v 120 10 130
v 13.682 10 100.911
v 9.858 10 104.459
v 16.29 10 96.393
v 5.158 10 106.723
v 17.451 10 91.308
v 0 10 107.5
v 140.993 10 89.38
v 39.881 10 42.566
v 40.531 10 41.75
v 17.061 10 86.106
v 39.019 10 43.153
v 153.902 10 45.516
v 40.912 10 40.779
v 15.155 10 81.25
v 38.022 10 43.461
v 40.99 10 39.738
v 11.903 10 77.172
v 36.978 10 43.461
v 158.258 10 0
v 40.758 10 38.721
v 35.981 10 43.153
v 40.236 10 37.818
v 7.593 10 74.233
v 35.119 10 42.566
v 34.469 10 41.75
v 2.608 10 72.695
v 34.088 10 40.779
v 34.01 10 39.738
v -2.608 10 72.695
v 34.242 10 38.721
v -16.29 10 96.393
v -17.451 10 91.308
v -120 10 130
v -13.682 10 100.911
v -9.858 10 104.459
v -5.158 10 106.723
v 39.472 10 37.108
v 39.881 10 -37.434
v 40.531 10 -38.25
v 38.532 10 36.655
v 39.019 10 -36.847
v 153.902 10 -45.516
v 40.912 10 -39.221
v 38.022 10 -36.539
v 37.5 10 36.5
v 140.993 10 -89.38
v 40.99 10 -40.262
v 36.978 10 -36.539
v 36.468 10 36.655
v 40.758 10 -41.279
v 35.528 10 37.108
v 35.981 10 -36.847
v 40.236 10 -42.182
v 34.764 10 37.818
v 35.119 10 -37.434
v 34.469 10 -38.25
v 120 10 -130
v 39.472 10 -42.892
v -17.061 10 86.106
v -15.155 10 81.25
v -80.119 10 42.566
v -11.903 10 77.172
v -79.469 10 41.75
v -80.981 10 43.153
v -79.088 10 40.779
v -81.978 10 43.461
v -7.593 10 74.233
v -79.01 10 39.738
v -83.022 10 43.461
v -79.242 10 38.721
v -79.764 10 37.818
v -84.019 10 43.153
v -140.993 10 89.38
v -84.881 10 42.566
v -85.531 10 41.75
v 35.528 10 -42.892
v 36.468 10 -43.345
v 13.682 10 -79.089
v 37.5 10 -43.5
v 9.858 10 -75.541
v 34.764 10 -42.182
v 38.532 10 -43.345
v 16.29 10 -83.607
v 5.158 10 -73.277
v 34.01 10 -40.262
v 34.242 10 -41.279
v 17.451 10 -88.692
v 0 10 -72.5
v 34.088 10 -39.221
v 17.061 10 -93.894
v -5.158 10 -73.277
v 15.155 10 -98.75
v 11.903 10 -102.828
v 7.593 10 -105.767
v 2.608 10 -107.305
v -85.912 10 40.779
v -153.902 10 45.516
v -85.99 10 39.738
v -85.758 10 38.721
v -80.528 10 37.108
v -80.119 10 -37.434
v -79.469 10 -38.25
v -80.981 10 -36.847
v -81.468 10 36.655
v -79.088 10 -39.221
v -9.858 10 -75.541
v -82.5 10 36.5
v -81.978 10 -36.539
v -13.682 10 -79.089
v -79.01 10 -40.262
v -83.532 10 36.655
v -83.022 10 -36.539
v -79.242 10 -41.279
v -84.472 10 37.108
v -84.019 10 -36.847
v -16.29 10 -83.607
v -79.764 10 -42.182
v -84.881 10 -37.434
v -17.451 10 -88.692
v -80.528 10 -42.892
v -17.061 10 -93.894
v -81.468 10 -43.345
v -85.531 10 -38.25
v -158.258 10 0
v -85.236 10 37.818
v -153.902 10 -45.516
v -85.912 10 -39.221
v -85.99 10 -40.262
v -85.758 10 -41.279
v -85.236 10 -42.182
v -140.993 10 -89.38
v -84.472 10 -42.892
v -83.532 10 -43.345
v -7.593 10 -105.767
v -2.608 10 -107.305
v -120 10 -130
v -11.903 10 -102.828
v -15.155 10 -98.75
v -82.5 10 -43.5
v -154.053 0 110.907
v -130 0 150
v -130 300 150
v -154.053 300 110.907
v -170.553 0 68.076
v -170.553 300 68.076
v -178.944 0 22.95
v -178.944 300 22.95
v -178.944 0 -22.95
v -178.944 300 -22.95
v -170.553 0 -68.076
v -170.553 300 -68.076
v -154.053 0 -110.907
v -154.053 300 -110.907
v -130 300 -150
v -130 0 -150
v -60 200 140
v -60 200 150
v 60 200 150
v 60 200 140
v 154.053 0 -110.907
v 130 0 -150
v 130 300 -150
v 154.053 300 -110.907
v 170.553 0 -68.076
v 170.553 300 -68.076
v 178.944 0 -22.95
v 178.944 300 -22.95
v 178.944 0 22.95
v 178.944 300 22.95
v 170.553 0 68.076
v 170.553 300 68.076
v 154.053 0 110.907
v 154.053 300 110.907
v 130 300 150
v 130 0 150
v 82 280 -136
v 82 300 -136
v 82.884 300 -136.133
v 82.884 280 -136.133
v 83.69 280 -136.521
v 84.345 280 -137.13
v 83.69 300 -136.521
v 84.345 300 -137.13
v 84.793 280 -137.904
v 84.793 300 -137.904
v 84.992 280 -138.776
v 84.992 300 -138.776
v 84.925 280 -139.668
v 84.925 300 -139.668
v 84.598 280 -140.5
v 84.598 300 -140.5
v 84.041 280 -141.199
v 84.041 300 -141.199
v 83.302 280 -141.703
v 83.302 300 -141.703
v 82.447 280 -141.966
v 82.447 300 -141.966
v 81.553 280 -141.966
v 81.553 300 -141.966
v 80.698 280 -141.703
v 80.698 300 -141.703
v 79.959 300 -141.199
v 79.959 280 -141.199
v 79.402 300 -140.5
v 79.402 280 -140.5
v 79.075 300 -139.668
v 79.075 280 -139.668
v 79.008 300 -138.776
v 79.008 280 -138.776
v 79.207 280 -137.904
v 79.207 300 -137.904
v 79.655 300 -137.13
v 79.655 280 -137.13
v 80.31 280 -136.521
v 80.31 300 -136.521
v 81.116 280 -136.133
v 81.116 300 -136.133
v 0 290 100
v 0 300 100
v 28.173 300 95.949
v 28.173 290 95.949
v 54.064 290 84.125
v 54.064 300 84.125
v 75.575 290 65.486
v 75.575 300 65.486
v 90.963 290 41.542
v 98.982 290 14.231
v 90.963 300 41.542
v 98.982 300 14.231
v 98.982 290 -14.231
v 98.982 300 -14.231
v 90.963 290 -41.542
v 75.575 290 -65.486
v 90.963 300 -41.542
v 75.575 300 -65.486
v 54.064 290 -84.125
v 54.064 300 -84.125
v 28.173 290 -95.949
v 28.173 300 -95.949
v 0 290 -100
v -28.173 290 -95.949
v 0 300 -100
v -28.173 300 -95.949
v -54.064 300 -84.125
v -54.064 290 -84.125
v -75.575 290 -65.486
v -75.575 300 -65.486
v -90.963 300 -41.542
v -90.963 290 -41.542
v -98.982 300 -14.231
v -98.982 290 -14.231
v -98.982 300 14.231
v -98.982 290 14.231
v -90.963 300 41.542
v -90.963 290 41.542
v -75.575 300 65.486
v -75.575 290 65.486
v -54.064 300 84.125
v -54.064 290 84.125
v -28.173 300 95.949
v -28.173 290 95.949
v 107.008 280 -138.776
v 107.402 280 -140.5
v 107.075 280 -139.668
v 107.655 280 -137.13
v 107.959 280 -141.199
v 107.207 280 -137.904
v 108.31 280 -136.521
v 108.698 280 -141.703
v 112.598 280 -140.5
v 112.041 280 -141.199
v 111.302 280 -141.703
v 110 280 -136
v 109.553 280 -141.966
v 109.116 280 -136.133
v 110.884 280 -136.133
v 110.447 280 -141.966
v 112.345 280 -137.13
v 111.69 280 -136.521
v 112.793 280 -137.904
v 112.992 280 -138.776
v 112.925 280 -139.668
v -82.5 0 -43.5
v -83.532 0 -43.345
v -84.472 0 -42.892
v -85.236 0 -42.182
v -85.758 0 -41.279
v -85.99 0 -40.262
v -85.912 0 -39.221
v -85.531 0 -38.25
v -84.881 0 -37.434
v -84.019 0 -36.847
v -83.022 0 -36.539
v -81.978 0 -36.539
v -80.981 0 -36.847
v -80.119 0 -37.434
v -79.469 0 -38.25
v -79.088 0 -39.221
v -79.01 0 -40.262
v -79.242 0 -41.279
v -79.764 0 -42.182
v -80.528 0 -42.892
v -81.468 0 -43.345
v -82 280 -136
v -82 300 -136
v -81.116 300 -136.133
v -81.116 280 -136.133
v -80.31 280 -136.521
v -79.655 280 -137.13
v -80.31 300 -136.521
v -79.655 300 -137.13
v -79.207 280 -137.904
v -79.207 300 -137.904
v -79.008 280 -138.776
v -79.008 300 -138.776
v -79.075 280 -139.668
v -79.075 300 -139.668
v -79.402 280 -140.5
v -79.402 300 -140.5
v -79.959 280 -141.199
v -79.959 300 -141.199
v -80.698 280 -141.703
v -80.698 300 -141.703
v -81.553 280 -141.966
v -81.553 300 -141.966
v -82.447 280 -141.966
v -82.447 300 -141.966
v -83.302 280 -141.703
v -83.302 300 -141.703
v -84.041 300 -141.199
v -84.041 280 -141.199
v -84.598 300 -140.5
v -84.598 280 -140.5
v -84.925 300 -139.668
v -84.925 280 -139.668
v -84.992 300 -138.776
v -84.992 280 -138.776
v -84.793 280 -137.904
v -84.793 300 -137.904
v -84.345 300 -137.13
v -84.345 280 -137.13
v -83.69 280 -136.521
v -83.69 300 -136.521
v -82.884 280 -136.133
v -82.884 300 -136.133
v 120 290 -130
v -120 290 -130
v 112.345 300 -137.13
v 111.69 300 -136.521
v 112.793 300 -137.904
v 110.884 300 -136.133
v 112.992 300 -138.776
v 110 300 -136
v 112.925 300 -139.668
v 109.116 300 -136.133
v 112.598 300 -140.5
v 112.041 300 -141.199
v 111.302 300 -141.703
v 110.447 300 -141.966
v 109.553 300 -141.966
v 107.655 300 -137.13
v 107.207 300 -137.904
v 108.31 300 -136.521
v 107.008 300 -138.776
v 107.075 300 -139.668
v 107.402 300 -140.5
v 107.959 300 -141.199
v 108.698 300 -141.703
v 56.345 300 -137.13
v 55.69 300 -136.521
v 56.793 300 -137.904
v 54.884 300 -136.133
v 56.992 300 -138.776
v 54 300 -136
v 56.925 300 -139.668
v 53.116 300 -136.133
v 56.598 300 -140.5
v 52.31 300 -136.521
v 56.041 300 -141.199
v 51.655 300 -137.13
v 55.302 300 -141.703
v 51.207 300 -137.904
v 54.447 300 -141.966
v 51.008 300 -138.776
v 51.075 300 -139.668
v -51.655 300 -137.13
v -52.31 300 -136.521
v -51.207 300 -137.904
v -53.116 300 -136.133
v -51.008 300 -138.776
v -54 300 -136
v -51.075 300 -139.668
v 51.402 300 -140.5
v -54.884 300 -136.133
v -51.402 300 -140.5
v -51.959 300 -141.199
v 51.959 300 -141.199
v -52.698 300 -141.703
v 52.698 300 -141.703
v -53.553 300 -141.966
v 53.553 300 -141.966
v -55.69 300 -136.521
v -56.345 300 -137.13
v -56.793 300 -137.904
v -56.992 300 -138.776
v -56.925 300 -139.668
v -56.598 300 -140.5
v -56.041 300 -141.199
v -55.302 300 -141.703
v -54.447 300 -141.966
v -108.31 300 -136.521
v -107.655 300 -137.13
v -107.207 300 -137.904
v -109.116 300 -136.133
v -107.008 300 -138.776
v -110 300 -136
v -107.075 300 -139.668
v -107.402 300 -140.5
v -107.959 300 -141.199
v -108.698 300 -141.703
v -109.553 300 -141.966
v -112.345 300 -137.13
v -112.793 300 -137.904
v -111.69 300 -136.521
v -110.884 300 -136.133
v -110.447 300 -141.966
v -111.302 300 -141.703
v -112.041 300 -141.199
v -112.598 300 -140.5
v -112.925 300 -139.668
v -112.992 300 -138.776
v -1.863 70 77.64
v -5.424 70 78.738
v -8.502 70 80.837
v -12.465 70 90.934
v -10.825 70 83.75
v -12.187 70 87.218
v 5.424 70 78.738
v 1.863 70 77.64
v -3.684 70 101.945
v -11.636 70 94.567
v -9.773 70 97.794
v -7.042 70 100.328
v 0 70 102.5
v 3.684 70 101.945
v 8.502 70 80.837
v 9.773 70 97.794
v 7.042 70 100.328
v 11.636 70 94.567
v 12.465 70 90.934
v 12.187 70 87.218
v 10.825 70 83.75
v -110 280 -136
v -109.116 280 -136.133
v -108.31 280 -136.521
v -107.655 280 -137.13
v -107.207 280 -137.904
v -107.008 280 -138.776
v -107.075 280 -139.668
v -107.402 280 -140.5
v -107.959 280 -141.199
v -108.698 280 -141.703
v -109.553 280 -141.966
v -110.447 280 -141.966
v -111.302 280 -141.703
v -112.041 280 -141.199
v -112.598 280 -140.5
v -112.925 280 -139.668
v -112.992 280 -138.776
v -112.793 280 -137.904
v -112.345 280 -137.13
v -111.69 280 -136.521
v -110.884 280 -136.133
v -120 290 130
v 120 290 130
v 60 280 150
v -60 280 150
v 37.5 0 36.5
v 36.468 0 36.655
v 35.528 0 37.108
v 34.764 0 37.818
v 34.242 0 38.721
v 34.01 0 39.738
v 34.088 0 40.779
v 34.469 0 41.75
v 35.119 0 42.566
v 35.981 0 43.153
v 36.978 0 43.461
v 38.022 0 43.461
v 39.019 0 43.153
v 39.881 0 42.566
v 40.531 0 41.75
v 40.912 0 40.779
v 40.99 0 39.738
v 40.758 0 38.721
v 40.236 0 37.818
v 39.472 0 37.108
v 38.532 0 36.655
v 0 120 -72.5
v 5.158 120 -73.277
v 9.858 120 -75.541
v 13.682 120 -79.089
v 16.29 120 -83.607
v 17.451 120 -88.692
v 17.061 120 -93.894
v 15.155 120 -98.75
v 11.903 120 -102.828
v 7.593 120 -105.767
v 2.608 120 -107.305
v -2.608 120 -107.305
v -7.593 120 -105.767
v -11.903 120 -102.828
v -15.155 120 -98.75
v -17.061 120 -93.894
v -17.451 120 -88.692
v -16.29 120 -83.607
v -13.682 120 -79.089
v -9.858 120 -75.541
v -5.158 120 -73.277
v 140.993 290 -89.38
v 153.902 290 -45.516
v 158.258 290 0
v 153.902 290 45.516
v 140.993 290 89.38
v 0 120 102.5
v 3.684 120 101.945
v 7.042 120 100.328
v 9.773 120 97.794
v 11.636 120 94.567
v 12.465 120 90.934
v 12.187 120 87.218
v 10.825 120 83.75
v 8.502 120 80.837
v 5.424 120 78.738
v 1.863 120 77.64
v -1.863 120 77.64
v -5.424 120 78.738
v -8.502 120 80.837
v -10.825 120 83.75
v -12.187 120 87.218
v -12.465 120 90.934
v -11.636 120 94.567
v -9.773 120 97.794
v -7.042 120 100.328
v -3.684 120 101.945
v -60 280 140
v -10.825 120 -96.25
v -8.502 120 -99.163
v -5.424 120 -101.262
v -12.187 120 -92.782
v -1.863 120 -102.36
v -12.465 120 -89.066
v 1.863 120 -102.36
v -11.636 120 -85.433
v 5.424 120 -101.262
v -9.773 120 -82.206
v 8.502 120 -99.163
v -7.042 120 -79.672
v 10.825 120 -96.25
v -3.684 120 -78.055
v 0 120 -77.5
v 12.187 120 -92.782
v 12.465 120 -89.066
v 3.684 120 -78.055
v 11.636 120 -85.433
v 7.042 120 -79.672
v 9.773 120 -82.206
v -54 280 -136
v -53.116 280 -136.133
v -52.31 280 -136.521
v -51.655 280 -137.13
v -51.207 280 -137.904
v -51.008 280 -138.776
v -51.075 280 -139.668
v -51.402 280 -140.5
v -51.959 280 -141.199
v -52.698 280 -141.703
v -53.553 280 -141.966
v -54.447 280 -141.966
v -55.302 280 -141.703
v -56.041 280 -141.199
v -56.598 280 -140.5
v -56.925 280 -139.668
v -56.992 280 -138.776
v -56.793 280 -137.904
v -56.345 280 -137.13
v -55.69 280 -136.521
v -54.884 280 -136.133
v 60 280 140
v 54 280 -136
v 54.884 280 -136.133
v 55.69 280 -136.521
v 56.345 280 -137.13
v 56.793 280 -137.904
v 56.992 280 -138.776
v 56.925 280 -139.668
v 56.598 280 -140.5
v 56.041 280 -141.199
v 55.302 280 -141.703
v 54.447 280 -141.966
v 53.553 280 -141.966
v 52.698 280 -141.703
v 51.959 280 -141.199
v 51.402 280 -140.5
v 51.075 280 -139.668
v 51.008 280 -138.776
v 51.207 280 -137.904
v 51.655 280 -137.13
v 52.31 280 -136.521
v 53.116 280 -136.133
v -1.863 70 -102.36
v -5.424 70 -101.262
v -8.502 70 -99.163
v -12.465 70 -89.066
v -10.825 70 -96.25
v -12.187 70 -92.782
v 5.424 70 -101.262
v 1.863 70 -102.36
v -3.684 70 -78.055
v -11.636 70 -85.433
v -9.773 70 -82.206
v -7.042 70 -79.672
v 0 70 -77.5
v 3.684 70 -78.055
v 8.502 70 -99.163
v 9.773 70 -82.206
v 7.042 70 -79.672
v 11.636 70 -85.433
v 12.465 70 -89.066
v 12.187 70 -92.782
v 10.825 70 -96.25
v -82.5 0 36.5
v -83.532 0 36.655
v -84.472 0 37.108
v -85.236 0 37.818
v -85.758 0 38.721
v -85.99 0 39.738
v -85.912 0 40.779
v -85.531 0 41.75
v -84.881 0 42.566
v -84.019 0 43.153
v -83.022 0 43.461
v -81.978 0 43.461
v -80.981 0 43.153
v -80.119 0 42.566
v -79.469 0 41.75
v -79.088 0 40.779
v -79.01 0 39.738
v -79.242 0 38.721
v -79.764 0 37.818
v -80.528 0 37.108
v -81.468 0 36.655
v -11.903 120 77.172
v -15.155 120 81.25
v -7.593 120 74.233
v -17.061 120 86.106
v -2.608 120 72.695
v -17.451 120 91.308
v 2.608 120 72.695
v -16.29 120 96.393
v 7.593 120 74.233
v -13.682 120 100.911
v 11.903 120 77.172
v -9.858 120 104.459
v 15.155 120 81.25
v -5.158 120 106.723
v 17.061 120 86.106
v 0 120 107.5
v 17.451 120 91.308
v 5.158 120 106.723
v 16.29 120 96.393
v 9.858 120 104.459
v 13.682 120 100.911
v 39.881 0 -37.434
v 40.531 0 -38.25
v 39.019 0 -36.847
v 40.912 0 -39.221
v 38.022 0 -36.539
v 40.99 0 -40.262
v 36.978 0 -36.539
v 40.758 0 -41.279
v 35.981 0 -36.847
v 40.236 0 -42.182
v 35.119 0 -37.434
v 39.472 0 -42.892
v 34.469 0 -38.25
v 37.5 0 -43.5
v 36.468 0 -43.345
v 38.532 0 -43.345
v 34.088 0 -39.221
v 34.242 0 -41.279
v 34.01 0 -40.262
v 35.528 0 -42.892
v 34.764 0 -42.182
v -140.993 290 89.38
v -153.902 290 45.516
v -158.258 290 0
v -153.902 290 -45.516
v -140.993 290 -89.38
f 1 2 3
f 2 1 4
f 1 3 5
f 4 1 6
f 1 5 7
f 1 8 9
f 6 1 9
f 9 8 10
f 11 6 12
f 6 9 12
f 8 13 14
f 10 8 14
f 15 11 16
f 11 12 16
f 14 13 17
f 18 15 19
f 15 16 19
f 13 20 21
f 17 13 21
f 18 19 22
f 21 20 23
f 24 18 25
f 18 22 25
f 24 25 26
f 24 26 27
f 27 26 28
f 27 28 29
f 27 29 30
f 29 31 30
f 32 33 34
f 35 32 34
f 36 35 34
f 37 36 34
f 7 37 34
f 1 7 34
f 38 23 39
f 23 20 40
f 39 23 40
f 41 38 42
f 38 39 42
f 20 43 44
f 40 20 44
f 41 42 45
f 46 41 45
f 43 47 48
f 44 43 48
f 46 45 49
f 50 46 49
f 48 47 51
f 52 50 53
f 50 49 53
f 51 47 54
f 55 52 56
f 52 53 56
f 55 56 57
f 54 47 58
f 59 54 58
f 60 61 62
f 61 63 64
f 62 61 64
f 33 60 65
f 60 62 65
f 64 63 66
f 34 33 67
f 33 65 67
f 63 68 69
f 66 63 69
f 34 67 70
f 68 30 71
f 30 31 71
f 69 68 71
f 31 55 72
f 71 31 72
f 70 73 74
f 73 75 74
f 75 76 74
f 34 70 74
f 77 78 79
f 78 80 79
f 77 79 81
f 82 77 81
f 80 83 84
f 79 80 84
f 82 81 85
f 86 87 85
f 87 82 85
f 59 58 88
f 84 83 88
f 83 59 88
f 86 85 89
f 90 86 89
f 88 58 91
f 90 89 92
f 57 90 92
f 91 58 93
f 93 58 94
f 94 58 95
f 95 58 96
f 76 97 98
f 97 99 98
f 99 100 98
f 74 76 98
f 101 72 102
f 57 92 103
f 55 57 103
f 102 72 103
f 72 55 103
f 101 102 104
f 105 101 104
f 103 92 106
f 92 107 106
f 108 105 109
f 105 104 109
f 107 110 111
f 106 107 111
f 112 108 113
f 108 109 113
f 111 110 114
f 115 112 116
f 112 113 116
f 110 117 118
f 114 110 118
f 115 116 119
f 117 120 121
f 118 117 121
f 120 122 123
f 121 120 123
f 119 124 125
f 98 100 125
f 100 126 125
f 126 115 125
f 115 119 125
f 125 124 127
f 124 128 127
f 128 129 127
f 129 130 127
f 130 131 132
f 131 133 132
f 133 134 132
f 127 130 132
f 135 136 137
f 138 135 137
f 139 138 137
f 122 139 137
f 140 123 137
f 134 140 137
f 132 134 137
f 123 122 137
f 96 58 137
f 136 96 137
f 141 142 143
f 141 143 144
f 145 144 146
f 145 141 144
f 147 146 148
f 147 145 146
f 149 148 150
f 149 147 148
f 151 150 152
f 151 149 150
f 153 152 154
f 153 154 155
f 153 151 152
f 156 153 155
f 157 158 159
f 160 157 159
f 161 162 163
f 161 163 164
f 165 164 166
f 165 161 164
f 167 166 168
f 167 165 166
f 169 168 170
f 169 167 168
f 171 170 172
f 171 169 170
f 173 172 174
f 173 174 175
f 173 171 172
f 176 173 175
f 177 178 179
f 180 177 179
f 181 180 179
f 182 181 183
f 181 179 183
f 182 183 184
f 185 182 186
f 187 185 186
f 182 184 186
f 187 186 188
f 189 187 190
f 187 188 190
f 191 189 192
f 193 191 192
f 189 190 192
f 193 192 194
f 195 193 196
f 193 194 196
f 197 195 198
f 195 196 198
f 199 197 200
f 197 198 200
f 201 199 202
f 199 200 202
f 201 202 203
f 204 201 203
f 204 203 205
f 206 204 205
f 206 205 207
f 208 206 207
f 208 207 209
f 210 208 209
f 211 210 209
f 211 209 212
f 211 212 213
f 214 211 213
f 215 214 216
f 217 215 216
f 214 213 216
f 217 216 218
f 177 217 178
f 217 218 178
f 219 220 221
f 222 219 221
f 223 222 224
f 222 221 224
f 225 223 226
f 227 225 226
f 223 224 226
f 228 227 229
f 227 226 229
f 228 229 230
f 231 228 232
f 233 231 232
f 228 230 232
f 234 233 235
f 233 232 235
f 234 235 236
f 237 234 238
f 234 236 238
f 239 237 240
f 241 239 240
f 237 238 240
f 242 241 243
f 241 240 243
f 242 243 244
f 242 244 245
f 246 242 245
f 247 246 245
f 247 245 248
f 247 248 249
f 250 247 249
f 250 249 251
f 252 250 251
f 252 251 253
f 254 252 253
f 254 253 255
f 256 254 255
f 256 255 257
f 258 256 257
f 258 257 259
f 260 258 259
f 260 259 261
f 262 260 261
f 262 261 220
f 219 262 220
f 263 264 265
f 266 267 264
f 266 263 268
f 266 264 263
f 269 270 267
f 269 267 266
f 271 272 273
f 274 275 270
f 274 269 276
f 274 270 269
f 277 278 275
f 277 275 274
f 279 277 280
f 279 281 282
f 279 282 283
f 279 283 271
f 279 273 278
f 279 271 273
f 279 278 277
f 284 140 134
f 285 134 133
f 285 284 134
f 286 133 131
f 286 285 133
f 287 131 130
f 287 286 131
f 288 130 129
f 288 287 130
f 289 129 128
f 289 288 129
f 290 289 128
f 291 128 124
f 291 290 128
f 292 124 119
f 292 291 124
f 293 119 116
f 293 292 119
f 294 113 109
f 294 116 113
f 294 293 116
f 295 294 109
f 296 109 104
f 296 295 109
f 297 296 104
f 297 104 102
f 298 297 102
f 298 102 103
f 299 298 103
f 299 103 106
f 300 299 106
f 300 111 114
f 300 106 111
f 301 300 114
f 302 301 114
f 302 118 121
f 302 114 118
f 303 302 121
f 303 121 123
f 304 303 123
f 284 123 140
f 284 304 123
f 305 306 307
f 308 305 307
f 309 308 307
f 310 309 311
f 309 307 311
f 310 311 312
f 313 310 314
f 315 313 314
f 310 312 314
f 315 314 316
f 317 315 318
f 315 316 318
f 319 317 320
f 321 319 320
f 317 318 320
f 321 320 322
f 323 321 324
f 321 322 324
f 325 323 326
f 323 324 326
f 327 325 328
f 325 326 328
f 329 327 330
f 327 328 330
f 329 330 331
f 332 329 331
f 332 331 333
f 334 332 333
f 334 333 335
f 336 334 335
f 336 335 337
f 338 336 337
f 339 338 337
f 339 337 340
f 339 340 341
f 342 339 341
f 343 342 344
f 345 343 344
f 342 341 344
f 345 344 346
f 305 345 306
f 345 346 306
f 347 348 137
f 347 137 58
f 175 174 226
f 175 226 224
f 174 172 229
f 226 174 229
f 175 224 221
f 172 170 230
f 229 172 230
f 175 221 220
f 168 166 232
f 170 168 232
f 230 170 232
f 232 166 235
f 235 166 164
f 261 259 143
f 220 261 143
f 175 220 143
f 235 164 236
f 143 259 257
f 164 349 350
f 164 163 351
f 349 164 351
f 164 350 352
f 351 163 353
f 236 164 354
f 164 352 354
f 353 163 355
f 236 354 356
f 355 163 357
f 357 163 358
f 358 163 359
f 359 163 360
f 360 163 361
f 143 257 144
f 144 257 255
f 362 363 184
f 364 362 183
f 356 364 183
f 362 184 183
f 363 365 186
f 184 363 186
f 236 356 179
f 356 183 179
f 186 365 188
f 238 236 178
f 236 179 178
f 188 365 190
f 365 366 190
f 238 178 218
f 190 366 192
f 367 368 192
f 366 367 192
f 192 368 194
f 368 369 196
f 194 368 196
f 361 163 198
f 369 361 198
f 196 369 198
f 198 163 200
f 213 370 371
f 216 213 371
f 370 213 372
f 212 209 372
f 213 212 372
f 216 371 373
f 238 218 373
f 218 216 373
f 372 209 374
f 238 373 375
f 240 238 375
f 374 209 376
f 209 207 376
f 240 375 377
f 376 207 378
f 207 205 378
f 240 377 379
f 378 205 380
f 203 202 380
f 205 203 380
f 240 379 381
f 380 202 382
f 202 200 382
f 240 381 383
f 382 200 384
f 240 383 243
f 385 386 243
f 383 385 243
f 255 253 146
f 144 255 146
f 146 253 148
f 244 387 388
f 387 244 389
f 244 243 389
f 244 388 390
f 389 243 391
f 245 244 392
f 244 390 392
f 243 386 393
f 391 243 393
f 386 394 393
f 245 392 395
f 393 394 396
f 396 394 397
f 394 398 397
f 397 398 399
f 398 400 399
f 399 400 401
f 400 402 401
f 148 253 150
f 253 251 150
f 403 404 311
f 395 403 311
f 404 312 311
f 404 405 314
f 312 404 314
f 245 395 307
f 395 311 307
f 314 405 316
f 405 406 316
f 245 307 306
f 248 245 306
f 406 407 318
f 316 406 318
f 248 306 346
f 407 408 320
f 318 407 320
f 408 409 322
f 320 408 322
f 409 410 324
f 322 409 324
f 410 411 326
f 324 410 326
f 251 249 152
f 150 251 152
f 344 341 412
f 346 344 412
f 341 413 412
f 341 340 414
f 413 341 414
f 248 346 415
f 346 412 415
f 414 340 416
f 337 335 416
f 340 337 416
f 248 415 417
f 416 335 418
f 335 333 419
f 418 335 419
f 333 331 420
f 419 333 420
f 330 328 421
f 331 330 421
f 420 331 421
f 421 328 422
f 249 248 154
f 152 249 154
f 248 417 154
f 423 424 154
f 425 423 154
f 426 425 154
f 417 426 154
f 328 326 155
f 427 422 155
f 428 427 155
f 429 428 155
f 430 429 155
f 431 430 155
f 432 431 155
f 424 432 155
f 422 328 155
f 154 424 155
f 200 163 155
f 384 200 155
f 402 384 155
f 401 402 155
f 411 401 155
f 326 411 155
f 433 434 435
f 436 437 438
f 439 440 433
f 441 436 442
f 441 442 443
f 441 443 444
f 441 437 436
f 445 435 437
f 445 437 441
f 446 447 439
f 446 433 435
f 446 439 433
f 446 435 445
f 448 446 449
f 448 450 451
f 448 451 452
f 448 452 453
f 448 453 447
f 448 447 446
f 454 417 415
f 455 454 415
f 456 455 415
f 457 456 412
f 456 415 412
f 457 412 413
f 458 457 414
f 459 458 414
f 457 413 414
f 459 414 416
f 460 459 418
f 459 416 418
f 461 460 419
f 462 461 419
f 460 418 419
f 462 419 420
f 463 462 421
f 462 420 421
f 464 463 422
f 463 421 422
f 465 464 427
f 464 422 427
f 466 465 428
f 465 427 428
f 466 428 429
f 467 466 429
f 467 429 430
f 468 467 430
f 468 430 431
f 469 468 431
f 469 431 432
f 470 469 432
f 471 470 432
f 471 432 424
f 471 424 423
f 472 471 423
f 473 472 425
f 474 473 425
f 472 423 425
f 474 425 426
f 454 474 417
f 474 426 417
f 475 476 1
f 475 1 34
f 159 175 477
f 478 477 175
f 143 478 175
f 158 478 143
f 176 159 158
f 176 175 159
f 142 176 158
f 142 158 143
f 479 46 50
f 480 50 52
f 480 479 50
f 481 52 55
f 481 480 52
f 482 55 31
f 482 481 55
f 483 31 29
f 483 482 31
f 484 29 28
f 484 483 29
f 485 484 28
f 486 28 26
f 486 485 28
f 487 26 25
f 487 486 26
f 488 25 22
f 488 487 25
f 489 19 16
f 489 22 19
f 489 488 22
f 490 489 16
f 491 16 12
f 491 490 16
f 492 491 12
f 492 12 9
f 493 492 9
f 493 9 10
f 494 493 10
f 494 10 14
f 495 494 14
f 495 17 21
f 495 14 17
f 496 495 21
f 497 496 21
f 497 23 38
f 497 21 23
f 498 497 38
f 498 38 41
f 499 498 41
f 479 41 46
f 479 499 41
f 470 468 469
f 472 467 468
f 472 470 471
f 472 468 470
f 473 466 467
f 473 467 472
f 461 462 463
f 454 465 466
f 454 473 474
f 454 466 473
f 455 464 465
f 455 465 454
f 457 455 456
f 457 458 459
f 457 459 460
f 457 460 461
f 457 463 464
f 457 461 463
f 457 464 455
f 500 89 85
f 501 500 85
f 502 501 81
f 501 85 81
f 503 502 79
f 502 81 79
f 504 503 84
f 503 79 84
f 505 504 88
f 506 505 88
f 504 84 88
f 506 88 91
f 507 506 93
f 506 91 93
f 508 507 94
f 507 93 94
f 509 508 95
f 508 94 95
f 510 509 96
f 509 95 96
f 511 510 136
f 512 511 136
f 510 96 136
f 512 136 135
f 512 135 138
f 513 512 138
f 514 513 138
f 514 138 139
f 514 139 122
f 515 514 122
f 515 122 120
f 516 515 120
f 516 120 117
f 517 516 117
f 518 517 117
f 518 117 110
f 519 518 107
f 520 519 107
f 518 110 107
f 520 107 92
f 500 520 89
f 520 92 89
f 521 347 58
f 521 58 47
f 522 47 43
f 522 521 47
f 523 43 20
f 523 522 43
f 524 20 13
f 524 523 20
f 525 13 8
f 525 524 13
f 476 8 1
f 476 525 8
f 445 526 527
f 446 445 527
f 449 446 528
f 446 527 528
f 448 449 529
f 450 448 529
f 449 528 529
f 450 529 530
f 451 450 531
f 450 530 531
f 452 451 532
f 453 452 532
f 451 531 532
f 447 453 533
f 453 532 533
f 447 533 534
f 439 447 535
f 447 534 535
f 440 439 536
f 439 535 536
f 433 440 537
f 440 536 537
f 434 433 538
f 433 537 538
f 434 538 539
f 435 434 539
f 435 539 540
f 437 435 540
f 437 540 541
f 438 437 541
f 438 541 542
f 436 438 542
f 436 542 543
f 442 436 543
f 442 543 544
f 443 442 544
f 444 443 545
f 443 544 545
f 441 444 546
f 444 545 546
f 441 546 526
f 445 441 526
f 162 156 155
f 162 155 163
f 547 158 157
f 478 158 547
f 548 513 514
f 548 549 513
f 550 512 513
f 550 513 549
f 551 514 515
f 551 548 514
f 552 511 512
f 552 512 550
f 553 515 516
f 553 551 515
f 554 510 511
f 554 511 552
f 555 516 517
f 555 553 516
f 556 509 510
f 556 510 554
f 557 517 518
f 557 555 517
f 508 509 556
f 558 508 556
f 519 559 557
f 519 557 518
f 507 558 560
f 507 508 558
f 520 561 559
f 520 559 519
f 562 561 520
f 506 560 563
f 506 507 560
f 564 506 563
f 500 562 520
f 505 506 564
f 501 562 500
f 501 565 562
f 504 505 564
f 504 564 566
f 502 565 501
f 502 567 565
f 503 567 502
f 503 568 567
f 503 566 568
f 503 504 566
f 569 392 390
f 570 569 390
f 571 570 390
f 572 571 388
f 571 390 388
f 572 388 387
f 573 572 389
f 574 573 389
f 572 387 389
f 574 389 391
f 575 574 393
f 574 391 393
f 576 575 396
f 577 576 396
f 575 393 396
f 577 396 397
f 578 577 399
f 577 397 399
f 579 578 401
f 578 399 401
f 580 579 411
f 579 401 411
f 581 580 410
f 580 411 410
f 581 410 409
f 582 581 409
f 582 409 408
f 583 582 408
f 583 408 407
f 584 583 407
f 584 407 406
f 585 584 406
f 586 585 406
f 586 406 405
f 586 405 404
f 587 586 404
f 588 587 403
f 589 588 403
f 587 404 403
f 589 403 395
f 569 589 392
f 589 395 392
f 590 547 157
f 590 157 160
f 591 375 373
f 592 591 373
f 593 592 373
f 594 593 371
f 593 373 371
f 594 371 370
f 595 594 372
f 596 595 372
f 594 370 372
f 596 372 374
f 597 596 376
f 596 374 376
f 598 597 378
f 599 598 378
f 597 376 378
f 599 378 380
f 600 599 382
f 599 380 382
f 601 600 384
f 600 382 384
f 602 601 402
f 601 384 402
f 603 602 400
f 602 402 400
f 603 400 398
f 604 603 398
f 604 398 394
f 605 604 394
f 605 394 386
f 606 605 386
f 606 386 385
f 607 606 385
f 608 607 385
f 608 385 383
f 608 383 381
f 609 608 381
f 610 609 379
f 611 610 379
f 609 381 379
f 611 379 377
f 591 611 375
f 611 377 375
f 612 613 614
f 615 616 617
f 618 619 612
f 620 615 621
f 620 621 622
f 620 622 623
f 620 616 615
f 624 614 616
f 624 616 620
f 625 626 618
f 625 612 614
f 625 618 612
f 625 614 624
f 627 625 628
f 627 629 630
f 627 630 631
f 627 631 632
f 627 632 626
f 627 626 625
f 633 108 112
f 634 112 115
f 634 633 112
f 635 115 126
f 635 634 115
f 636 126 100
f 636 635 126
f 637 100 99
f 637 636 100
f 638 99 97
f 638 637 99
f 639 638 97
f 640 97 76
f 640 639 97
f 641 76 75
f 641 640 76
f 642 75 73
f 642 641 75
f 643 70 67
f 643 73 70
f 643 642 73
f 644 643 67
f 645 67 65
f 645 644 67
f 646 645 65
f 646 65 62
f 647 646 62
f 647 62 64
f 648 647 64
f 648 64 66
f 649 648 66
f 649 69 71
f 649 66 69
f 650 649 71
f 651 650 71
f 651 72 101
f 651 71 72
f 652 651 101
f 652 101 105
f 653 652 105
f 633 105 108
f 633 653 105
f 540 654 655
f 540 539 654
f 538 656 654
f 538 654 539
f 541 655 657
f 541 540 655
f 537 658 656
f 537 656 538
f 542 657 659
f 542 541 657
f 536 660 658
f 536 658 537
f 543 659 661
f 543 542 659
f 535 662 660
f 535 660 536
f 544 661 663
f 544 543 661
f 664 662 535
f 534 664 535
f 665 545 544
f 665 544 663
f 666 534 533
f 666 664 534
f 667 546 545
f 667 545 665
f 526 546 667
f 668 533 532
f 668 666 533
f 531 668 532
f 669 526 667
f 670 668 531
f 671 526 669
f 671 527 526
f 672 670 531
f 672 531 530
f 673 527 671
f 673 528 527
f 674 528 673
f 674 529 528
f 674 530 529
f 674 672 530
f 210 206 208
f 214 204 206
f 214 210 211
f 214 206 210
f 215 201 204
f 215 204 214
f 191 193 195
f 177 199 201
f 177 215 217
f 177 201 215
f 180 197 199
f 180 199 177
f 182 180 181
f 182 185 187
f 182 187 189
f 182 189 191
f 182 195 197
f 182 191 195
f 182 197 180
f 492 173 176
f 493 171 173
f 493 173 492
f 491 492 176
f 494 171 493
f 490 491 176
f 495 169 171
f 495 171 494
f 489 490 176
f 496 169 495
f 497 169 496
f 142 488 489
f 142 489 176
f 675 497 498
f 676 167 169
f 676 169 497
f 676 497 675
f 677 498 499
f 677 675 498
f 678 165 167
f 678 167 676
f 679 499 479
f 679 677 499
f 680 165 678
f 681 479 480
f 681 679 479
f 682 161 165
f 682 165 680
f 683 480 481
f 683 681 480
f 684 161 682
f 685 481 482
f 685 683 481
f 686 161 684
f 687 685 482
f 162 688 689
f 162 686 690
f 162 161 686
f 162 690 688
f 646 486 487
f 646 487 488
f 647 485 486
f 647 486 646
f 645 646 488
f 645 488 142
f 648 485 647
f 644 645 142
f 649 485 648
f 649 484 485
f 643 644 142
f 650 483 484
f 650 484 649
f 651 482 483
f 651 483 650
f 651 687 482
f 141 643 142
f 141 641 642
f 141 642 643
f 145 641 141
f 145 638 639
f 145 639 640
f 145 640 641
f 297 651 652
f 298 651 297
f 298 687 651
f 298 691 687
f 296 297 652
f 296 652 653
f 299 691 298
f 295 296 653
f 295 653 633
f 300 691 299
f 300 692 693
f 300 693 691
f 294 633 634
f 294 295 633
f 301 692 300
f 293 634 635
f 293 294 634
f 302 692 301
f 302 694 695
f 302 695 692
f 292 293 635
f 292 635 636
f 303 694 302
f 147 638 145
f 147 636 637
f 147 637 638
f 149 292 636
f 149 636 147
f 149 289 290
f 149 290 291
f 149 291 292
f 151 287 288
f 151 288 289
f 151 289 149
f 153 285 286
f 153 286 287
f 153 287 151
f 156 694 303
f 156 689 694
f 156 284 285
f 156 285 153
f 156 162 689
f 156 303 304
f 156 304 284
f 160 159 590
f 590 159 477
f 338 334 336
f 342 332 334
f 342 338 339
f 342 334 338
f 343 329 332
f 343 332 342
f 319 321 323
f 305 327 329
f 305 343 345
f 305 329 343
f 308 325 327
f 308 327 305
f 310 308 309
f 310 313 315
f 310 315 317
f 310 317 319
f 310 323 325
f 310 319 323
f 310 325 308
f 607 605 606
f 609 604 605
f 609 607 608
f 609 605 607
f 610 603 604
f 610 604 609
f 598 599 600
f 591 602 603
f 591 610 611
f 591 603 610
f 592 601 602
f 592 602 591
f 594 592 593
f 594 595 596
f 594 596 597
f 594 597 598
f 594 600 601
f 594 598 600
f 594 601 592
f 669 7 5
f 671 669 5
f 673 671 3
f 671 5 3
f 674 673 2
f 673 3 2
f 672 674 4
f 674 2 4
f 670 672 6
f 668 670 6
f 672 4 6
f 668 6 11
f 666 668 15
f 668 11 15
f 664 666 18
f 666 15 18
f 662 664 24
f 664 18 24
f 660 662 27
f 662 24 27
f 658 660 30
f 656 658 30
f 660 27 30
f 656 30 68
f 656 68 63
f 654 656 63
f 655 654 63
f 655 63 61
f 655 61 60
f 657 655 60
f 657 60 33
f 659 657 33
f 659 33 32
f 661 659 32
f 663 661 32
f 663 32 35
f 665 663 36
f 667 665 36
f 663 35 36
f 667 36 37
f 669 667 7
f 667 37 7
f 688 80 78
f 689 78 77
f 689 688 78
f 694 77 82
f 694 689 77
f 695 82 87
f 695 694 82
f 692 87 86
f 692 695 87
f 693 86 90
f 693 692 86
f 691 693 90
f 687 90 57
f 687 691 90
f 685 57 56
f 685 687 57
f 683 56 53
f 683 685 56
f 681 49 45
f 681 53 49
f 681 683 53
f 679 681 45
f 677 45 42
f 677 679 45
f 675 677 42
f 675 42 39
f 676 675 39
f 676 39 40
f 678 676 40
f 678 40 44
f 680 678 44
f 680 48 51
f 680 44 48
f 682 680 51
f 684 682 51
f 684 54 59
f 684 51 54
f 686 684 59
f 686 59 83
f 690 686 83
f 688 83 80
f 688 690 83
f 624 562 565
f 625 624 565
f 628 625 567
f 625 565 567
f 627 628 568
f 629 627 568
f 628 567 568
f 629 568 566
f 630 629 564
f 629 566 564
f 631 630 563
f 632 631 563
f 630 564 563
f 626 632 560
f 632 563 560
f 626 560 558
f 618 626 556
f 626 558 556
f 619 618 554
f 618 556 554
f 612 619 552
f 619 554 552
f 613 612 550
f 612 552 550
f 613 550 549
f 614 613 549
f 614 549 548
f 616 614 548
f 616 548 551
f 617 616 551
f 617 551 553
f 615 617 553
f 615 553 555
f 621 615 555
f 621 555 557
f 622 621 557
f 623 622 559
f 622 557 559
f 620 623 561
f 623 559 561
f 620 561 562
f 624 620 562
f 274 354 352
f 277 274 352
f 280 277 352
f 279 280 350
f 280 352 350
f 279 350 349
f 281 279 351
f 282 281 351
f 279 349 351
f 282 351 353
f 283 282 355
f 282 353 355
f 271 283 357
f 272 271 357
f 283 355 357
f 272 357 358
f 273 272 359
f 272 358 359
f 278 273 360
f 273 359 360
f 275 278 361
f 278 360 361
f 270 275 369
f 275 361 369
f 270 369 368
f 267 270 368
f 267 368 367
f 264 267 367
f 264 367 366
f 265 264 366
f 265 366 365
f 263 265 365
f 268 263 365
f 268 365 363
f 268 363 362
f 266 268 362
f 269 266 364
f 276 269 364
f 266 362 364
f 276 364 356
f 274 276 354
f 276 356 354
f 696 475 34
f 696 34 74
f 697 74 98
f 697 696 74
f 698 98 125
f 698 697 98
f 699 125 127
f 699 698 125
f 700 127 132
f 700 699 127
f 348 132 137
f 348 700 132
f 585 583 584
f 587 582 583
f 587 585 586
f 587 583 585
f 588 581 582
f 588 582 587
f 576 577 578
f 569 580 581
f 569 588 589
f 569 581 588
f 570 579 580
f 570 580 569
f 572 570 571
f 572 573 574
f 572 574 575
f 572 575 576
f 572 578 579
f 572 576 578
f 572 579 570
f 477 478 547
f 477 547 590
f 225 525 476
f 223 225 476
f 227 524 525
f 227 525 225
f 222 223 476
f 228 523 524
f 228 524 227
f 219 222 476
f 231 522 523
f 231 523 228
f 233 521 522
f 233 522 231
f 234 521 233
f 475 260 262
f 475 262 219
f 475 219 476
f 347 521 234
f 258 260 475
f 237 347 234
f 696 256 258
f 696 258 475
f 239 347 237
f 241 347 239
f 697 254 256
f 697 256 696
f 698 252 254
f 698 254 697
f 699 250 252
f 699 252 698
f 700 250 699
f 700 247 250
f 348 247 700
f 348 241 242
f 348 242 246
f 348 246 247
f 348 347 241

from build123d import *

# Parameters (mm, degrees)
BOSS_EXTRUDE1_DEPTH      = 300
CUT_EXTRUDE8_DEPTH       = 280
COMPARTMENT_INPUT_R      = 100
CUT_EXTRUDE1_DEPTH       = 240
LCD_W                    = 120
LCD_H                    = 80
CUT_EXTRUDE2_DEPTH       = 10
HINGE_HOLES_R            = 3
CUT_EXTRUDE3_DEPTH       = 20
POLES_FOR_MIDDLE_LAYER_R = 17.5
BOSS_EXTRUDE2_DEPTH      = 110
HOLES_FOR_POLES_R        = 12.5
CUT_EXTRUDE6_DEPTH       = 50
CUT_EXTRUDE9_REACH       = 382.657
POWER_SUPPLY_HOLES_R     = 3.5


with BuildPart() as part:
    # Case 2 → Boss-Extrude1 (new body)
    with BuildSketch(Plane(origin=(0, 0, 0), x_dir=(1, 0, 0), z_dir=(0, 1, 0))):
        with BuildLine():
            Line((-130, 150), (130, 150))
            ThreePointArc((130, 150), (180, 0), (130, -150))
            Line((130, -150), (-130, -150))
            ThreePointArc((-130, -150), (-180, 0), (-130, 150))
        make_face()
    extrude(amount=BOSS_EXTRUDE1_DEPTH)

    # Hollow compartment → Cut-Extrude8 (cut)
    with BuildSketch(Plane(origin=(0, 290, 0), x_dir=(1, 0, 0), z_dir=(0, 1, 0))):
        with BuildLine():
            Line((-120, 130), (120, 130))
            ThreePointArc((120, 130), (158.257589982, 0), (120, -130))
            Line((120, -130), (-120, -130))
            ThreePointArc((-120, -130), (-158.257589982, 0), (-120, 130))
        make_face()
    extrude(amount=-CUT_EXTRUDE8_DEPTH, mode=Mode.SUBTRACT)

    # Compartment Input → Cut-Extrude1 (cut)
    with BuildSketch(Plane(origin=(0, 300, 0), x_dir=(1, 0, 0), z_dir=(0, 1, 0))):
        with Locations(Location((0, 0, 0), (0, 0, 270))):
            Circle(COMPARTMENT_INPUT_R)
    extrude(amount=-CUT_EXTRUDE1_DEPTH, mode=Mode.SUBTRACT)

    # LCD → Cut-Extrude2 (cut)
    with BuildSketch(Plane.XY.offset(150)):
        with Locations((0, 240)):
            Rectangle(LCD_W, LCD_H)
    extrude(amount=-CUT_EXTRUDE2_DEPTH, mode=Mode.SUBTRACT)

    # Hinge holes → Cut-Extrude3 (cut)
    with BuildSketch(Plane(origin=(0, 300, 0), x_dir=(1, 0, 0), z_dir=(0, 1, 0))):
        with Locations(Location((-110, 139, 0), (0, 0, 270))):
            Circle(HINGE_HOLES_R)
        with Locations(Location((-82, 139, 0), (0, 0, 270))):
            Circle(HINGE_HOLES_R)
        with Locations(Location((-54, 139, 0), (0, 0, 270))):
            Circle(HINGE_HOLES_R)
        with Locations(Location((54, 139, 0), (0, 0, 270))):
            Circle(HINGE_HOLES_R)
        with Locations(Location((82, 139, 0), (0, 0, 270))):
            Circle(HINGE_HOLES_R)
        with Locations(Location((110, 139, 0), (0, 0, 270))):
            Circle(HINGE_HOLES_R)
    extrude(amount=-CUT_EXTRUDE3_DEPTH, mode=Mode.SUBTRACT)

    # Poles for middle layer → Boss-Extrude2 (add)
    with BuildSketch(Plane(origin=(0, 10, 0), x_dir=(1, 0, 0), z_dir=(0, 1, 0))):
        with Locations(Location((0, 90, 0), (0, 0, 270))):
            Circle(POLES_FOR_MIDDLE_LAYER_R)
        with Locations(Location((0, -90, 0), (0, 0, 270))):
            Circle(POLES_FOR_MIDDLE_LAYER_R)
    extrude(amount=BOSS_EXTRUDE2_DEPTH)

    # Holes for poles → Cut-Extrude6 (cut)
    with BuildSketch(Plane(origin=(0, 120, 0), x_dir=(1, 0, 0), z_dir=(0, 1, 0))):
        with Locations(Location((0, -90, 0), (0, 0, 270))):
            Circle(HOLES_FOR_POLES_R)
        with Locations(Location((0, 90, 0), (0, 0, 270))):
            Circle(HOLES_FOR_POLES_R)
    extrude(amount=-CUT_EXTRUDE6_DEPTH, mode=Mode.SUBTRACT)

    # Power supply holes → Cut-Extrude9 (cut, up to next)
    with BuildSketch(Plane(origin=(0, 0, 0), x_dir=(1, 0, 0), z_dir=(0, 1, 0)), mode=Mode.PRIVATE) as cut_extrude9_sk1:
        with Locations(Location((-82.5, 40, 0), (0, 0, 90))):
            Circle(POWER_SUPPLY_HOLES_R)
    cut_extrude9_tool1 = extrude(cut_extrude9_sk1.sketch, amount=CUT_EXTRUDE9_REACH, mode=Mode.PRIVATE) & part.part
    # Power supply holes → Cut-Extrude9 (cut, up to next)
    with BuildSketch(Plane(origin=(0, 0, 0), x_dir=(1, 0, 0), z_dir=(0, 1, 0)), mode=Mode.PRIVATE) as cut_extrude9_sk2:
        with Locations(Location((37.5, 40, 0), (0, 0, 90))):
            Circle(POWER_SUPPLY_HOLES_R)
    cut_extrude9_tool2 = extrude(cut_extrude9_sk2.sketch, amount=CUT_EXTRUDE9_REACH, mode=Mode.PRIVATE) & part.part
    # Power supply holes → Cut-Extrude9 (cut, up to next)
    with BuildSketch(Plane(origin=(0, 0, 0), x_dir=(1, 0, 0), z_dir=(0, 1, 0)), mode=Mode.PRIVATE) as cut_extrude9_sk3:
        with Locations(Location((37.5, -40, 0), (0, 0, 90))):
            Circle(POWER_SUPPLY_HOLES_R)
    cut_extrude9_tool3 = extrude(cut_extrude9_sk3.sketch, amount=CUT_EXTRUDE9_REACH, mode=Mode.PRIVATE) & part.part
    # Power supply holes → Cut-Extrude9 (cut, up to next)
    with BuildSketch(Plane(origin=(0, 0, 0), x_dir=(1, 0, 0), z_dir=(0, 1, 0)), mode=Mode.PRIVATE) as cut_extrude9_sk4:
        with Locations(Location((-82.5, -40, 0), (0, 0, 90))):
            Circle(POWER_SUPPLY_HOLES_R)
    cut_extrude9_tool4 = extrude(cut_extrude9_sk4.sketch, amount=CUT_EXTRUDE9_REACH, mode=Mode.PRIVATE) & part.part
    add(cut_extrude9_tool1.solids().sort_by_distance((-82.5, 0, -40))[0], mode=Mode.SUBTRACT)
    add(cut_extrude9_tool2.solids().sort_by_distance((37.5, 0, -40))[0], mode=Mode.SUBTRACT)
    add(cut_extrude9_tool3.solids().sort_by_distance((37.5, 0, 40))[0], mode=Mode.SUBTRACT)
    add(cut_extrude9_tool4.solids().sort_by_distance((-82.5, 0, 40))[0], mode=Mode.SUBTRACT)


solid = part.part
